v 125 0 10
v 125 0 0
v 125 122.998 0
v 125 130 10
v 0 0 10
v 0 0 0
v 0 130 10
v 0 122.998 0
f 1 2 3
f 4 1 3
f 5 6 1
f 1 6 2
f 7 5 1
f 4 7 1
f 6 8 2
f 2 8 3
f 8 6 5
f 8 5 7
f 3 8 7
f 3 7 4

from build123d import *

# Parameters (mm, degrees)
ESQUISSE1_W        = 125
ESQUISSE1_H        = 130
BOSS_EXTRU_1_DEPTH = 10
CHANFREIN1_SIZE2   = 7.002075382
CHANFREIN1_SIZE    = 10


with BuildPart() as part:
    # Esquisse1 → Boss.-Extru.1 (new body)
    with BuildSketch(Plane.XY):
        with Locations((62.5, 65)):
            Rectangle(ESQUISSE1_W, ESQUISSE1_H)
    extrude(amount=BOSS_EXTRU_1_DEPTH)

    # Chanfrein1
    chanfrein1_edges = [part.edges().sort_by_distance(p)[0] for p in [
        (62.5, 130, 0),
    ]]
    chanfrein1_side = [part.faces().sort_by_distance(p)[0] for p in [
        (62.5, 130, 0.140041508),
    ]]
    chamfer(chanfrein1_edges, length=CHANFREIN1_SIZE - 0.0001, length2=CHANFREIN1_SIZE2 - 0.0001, reference=chanfrein1_side[0])  # a hair under: the kernel refuses the full size


solid = part.part
